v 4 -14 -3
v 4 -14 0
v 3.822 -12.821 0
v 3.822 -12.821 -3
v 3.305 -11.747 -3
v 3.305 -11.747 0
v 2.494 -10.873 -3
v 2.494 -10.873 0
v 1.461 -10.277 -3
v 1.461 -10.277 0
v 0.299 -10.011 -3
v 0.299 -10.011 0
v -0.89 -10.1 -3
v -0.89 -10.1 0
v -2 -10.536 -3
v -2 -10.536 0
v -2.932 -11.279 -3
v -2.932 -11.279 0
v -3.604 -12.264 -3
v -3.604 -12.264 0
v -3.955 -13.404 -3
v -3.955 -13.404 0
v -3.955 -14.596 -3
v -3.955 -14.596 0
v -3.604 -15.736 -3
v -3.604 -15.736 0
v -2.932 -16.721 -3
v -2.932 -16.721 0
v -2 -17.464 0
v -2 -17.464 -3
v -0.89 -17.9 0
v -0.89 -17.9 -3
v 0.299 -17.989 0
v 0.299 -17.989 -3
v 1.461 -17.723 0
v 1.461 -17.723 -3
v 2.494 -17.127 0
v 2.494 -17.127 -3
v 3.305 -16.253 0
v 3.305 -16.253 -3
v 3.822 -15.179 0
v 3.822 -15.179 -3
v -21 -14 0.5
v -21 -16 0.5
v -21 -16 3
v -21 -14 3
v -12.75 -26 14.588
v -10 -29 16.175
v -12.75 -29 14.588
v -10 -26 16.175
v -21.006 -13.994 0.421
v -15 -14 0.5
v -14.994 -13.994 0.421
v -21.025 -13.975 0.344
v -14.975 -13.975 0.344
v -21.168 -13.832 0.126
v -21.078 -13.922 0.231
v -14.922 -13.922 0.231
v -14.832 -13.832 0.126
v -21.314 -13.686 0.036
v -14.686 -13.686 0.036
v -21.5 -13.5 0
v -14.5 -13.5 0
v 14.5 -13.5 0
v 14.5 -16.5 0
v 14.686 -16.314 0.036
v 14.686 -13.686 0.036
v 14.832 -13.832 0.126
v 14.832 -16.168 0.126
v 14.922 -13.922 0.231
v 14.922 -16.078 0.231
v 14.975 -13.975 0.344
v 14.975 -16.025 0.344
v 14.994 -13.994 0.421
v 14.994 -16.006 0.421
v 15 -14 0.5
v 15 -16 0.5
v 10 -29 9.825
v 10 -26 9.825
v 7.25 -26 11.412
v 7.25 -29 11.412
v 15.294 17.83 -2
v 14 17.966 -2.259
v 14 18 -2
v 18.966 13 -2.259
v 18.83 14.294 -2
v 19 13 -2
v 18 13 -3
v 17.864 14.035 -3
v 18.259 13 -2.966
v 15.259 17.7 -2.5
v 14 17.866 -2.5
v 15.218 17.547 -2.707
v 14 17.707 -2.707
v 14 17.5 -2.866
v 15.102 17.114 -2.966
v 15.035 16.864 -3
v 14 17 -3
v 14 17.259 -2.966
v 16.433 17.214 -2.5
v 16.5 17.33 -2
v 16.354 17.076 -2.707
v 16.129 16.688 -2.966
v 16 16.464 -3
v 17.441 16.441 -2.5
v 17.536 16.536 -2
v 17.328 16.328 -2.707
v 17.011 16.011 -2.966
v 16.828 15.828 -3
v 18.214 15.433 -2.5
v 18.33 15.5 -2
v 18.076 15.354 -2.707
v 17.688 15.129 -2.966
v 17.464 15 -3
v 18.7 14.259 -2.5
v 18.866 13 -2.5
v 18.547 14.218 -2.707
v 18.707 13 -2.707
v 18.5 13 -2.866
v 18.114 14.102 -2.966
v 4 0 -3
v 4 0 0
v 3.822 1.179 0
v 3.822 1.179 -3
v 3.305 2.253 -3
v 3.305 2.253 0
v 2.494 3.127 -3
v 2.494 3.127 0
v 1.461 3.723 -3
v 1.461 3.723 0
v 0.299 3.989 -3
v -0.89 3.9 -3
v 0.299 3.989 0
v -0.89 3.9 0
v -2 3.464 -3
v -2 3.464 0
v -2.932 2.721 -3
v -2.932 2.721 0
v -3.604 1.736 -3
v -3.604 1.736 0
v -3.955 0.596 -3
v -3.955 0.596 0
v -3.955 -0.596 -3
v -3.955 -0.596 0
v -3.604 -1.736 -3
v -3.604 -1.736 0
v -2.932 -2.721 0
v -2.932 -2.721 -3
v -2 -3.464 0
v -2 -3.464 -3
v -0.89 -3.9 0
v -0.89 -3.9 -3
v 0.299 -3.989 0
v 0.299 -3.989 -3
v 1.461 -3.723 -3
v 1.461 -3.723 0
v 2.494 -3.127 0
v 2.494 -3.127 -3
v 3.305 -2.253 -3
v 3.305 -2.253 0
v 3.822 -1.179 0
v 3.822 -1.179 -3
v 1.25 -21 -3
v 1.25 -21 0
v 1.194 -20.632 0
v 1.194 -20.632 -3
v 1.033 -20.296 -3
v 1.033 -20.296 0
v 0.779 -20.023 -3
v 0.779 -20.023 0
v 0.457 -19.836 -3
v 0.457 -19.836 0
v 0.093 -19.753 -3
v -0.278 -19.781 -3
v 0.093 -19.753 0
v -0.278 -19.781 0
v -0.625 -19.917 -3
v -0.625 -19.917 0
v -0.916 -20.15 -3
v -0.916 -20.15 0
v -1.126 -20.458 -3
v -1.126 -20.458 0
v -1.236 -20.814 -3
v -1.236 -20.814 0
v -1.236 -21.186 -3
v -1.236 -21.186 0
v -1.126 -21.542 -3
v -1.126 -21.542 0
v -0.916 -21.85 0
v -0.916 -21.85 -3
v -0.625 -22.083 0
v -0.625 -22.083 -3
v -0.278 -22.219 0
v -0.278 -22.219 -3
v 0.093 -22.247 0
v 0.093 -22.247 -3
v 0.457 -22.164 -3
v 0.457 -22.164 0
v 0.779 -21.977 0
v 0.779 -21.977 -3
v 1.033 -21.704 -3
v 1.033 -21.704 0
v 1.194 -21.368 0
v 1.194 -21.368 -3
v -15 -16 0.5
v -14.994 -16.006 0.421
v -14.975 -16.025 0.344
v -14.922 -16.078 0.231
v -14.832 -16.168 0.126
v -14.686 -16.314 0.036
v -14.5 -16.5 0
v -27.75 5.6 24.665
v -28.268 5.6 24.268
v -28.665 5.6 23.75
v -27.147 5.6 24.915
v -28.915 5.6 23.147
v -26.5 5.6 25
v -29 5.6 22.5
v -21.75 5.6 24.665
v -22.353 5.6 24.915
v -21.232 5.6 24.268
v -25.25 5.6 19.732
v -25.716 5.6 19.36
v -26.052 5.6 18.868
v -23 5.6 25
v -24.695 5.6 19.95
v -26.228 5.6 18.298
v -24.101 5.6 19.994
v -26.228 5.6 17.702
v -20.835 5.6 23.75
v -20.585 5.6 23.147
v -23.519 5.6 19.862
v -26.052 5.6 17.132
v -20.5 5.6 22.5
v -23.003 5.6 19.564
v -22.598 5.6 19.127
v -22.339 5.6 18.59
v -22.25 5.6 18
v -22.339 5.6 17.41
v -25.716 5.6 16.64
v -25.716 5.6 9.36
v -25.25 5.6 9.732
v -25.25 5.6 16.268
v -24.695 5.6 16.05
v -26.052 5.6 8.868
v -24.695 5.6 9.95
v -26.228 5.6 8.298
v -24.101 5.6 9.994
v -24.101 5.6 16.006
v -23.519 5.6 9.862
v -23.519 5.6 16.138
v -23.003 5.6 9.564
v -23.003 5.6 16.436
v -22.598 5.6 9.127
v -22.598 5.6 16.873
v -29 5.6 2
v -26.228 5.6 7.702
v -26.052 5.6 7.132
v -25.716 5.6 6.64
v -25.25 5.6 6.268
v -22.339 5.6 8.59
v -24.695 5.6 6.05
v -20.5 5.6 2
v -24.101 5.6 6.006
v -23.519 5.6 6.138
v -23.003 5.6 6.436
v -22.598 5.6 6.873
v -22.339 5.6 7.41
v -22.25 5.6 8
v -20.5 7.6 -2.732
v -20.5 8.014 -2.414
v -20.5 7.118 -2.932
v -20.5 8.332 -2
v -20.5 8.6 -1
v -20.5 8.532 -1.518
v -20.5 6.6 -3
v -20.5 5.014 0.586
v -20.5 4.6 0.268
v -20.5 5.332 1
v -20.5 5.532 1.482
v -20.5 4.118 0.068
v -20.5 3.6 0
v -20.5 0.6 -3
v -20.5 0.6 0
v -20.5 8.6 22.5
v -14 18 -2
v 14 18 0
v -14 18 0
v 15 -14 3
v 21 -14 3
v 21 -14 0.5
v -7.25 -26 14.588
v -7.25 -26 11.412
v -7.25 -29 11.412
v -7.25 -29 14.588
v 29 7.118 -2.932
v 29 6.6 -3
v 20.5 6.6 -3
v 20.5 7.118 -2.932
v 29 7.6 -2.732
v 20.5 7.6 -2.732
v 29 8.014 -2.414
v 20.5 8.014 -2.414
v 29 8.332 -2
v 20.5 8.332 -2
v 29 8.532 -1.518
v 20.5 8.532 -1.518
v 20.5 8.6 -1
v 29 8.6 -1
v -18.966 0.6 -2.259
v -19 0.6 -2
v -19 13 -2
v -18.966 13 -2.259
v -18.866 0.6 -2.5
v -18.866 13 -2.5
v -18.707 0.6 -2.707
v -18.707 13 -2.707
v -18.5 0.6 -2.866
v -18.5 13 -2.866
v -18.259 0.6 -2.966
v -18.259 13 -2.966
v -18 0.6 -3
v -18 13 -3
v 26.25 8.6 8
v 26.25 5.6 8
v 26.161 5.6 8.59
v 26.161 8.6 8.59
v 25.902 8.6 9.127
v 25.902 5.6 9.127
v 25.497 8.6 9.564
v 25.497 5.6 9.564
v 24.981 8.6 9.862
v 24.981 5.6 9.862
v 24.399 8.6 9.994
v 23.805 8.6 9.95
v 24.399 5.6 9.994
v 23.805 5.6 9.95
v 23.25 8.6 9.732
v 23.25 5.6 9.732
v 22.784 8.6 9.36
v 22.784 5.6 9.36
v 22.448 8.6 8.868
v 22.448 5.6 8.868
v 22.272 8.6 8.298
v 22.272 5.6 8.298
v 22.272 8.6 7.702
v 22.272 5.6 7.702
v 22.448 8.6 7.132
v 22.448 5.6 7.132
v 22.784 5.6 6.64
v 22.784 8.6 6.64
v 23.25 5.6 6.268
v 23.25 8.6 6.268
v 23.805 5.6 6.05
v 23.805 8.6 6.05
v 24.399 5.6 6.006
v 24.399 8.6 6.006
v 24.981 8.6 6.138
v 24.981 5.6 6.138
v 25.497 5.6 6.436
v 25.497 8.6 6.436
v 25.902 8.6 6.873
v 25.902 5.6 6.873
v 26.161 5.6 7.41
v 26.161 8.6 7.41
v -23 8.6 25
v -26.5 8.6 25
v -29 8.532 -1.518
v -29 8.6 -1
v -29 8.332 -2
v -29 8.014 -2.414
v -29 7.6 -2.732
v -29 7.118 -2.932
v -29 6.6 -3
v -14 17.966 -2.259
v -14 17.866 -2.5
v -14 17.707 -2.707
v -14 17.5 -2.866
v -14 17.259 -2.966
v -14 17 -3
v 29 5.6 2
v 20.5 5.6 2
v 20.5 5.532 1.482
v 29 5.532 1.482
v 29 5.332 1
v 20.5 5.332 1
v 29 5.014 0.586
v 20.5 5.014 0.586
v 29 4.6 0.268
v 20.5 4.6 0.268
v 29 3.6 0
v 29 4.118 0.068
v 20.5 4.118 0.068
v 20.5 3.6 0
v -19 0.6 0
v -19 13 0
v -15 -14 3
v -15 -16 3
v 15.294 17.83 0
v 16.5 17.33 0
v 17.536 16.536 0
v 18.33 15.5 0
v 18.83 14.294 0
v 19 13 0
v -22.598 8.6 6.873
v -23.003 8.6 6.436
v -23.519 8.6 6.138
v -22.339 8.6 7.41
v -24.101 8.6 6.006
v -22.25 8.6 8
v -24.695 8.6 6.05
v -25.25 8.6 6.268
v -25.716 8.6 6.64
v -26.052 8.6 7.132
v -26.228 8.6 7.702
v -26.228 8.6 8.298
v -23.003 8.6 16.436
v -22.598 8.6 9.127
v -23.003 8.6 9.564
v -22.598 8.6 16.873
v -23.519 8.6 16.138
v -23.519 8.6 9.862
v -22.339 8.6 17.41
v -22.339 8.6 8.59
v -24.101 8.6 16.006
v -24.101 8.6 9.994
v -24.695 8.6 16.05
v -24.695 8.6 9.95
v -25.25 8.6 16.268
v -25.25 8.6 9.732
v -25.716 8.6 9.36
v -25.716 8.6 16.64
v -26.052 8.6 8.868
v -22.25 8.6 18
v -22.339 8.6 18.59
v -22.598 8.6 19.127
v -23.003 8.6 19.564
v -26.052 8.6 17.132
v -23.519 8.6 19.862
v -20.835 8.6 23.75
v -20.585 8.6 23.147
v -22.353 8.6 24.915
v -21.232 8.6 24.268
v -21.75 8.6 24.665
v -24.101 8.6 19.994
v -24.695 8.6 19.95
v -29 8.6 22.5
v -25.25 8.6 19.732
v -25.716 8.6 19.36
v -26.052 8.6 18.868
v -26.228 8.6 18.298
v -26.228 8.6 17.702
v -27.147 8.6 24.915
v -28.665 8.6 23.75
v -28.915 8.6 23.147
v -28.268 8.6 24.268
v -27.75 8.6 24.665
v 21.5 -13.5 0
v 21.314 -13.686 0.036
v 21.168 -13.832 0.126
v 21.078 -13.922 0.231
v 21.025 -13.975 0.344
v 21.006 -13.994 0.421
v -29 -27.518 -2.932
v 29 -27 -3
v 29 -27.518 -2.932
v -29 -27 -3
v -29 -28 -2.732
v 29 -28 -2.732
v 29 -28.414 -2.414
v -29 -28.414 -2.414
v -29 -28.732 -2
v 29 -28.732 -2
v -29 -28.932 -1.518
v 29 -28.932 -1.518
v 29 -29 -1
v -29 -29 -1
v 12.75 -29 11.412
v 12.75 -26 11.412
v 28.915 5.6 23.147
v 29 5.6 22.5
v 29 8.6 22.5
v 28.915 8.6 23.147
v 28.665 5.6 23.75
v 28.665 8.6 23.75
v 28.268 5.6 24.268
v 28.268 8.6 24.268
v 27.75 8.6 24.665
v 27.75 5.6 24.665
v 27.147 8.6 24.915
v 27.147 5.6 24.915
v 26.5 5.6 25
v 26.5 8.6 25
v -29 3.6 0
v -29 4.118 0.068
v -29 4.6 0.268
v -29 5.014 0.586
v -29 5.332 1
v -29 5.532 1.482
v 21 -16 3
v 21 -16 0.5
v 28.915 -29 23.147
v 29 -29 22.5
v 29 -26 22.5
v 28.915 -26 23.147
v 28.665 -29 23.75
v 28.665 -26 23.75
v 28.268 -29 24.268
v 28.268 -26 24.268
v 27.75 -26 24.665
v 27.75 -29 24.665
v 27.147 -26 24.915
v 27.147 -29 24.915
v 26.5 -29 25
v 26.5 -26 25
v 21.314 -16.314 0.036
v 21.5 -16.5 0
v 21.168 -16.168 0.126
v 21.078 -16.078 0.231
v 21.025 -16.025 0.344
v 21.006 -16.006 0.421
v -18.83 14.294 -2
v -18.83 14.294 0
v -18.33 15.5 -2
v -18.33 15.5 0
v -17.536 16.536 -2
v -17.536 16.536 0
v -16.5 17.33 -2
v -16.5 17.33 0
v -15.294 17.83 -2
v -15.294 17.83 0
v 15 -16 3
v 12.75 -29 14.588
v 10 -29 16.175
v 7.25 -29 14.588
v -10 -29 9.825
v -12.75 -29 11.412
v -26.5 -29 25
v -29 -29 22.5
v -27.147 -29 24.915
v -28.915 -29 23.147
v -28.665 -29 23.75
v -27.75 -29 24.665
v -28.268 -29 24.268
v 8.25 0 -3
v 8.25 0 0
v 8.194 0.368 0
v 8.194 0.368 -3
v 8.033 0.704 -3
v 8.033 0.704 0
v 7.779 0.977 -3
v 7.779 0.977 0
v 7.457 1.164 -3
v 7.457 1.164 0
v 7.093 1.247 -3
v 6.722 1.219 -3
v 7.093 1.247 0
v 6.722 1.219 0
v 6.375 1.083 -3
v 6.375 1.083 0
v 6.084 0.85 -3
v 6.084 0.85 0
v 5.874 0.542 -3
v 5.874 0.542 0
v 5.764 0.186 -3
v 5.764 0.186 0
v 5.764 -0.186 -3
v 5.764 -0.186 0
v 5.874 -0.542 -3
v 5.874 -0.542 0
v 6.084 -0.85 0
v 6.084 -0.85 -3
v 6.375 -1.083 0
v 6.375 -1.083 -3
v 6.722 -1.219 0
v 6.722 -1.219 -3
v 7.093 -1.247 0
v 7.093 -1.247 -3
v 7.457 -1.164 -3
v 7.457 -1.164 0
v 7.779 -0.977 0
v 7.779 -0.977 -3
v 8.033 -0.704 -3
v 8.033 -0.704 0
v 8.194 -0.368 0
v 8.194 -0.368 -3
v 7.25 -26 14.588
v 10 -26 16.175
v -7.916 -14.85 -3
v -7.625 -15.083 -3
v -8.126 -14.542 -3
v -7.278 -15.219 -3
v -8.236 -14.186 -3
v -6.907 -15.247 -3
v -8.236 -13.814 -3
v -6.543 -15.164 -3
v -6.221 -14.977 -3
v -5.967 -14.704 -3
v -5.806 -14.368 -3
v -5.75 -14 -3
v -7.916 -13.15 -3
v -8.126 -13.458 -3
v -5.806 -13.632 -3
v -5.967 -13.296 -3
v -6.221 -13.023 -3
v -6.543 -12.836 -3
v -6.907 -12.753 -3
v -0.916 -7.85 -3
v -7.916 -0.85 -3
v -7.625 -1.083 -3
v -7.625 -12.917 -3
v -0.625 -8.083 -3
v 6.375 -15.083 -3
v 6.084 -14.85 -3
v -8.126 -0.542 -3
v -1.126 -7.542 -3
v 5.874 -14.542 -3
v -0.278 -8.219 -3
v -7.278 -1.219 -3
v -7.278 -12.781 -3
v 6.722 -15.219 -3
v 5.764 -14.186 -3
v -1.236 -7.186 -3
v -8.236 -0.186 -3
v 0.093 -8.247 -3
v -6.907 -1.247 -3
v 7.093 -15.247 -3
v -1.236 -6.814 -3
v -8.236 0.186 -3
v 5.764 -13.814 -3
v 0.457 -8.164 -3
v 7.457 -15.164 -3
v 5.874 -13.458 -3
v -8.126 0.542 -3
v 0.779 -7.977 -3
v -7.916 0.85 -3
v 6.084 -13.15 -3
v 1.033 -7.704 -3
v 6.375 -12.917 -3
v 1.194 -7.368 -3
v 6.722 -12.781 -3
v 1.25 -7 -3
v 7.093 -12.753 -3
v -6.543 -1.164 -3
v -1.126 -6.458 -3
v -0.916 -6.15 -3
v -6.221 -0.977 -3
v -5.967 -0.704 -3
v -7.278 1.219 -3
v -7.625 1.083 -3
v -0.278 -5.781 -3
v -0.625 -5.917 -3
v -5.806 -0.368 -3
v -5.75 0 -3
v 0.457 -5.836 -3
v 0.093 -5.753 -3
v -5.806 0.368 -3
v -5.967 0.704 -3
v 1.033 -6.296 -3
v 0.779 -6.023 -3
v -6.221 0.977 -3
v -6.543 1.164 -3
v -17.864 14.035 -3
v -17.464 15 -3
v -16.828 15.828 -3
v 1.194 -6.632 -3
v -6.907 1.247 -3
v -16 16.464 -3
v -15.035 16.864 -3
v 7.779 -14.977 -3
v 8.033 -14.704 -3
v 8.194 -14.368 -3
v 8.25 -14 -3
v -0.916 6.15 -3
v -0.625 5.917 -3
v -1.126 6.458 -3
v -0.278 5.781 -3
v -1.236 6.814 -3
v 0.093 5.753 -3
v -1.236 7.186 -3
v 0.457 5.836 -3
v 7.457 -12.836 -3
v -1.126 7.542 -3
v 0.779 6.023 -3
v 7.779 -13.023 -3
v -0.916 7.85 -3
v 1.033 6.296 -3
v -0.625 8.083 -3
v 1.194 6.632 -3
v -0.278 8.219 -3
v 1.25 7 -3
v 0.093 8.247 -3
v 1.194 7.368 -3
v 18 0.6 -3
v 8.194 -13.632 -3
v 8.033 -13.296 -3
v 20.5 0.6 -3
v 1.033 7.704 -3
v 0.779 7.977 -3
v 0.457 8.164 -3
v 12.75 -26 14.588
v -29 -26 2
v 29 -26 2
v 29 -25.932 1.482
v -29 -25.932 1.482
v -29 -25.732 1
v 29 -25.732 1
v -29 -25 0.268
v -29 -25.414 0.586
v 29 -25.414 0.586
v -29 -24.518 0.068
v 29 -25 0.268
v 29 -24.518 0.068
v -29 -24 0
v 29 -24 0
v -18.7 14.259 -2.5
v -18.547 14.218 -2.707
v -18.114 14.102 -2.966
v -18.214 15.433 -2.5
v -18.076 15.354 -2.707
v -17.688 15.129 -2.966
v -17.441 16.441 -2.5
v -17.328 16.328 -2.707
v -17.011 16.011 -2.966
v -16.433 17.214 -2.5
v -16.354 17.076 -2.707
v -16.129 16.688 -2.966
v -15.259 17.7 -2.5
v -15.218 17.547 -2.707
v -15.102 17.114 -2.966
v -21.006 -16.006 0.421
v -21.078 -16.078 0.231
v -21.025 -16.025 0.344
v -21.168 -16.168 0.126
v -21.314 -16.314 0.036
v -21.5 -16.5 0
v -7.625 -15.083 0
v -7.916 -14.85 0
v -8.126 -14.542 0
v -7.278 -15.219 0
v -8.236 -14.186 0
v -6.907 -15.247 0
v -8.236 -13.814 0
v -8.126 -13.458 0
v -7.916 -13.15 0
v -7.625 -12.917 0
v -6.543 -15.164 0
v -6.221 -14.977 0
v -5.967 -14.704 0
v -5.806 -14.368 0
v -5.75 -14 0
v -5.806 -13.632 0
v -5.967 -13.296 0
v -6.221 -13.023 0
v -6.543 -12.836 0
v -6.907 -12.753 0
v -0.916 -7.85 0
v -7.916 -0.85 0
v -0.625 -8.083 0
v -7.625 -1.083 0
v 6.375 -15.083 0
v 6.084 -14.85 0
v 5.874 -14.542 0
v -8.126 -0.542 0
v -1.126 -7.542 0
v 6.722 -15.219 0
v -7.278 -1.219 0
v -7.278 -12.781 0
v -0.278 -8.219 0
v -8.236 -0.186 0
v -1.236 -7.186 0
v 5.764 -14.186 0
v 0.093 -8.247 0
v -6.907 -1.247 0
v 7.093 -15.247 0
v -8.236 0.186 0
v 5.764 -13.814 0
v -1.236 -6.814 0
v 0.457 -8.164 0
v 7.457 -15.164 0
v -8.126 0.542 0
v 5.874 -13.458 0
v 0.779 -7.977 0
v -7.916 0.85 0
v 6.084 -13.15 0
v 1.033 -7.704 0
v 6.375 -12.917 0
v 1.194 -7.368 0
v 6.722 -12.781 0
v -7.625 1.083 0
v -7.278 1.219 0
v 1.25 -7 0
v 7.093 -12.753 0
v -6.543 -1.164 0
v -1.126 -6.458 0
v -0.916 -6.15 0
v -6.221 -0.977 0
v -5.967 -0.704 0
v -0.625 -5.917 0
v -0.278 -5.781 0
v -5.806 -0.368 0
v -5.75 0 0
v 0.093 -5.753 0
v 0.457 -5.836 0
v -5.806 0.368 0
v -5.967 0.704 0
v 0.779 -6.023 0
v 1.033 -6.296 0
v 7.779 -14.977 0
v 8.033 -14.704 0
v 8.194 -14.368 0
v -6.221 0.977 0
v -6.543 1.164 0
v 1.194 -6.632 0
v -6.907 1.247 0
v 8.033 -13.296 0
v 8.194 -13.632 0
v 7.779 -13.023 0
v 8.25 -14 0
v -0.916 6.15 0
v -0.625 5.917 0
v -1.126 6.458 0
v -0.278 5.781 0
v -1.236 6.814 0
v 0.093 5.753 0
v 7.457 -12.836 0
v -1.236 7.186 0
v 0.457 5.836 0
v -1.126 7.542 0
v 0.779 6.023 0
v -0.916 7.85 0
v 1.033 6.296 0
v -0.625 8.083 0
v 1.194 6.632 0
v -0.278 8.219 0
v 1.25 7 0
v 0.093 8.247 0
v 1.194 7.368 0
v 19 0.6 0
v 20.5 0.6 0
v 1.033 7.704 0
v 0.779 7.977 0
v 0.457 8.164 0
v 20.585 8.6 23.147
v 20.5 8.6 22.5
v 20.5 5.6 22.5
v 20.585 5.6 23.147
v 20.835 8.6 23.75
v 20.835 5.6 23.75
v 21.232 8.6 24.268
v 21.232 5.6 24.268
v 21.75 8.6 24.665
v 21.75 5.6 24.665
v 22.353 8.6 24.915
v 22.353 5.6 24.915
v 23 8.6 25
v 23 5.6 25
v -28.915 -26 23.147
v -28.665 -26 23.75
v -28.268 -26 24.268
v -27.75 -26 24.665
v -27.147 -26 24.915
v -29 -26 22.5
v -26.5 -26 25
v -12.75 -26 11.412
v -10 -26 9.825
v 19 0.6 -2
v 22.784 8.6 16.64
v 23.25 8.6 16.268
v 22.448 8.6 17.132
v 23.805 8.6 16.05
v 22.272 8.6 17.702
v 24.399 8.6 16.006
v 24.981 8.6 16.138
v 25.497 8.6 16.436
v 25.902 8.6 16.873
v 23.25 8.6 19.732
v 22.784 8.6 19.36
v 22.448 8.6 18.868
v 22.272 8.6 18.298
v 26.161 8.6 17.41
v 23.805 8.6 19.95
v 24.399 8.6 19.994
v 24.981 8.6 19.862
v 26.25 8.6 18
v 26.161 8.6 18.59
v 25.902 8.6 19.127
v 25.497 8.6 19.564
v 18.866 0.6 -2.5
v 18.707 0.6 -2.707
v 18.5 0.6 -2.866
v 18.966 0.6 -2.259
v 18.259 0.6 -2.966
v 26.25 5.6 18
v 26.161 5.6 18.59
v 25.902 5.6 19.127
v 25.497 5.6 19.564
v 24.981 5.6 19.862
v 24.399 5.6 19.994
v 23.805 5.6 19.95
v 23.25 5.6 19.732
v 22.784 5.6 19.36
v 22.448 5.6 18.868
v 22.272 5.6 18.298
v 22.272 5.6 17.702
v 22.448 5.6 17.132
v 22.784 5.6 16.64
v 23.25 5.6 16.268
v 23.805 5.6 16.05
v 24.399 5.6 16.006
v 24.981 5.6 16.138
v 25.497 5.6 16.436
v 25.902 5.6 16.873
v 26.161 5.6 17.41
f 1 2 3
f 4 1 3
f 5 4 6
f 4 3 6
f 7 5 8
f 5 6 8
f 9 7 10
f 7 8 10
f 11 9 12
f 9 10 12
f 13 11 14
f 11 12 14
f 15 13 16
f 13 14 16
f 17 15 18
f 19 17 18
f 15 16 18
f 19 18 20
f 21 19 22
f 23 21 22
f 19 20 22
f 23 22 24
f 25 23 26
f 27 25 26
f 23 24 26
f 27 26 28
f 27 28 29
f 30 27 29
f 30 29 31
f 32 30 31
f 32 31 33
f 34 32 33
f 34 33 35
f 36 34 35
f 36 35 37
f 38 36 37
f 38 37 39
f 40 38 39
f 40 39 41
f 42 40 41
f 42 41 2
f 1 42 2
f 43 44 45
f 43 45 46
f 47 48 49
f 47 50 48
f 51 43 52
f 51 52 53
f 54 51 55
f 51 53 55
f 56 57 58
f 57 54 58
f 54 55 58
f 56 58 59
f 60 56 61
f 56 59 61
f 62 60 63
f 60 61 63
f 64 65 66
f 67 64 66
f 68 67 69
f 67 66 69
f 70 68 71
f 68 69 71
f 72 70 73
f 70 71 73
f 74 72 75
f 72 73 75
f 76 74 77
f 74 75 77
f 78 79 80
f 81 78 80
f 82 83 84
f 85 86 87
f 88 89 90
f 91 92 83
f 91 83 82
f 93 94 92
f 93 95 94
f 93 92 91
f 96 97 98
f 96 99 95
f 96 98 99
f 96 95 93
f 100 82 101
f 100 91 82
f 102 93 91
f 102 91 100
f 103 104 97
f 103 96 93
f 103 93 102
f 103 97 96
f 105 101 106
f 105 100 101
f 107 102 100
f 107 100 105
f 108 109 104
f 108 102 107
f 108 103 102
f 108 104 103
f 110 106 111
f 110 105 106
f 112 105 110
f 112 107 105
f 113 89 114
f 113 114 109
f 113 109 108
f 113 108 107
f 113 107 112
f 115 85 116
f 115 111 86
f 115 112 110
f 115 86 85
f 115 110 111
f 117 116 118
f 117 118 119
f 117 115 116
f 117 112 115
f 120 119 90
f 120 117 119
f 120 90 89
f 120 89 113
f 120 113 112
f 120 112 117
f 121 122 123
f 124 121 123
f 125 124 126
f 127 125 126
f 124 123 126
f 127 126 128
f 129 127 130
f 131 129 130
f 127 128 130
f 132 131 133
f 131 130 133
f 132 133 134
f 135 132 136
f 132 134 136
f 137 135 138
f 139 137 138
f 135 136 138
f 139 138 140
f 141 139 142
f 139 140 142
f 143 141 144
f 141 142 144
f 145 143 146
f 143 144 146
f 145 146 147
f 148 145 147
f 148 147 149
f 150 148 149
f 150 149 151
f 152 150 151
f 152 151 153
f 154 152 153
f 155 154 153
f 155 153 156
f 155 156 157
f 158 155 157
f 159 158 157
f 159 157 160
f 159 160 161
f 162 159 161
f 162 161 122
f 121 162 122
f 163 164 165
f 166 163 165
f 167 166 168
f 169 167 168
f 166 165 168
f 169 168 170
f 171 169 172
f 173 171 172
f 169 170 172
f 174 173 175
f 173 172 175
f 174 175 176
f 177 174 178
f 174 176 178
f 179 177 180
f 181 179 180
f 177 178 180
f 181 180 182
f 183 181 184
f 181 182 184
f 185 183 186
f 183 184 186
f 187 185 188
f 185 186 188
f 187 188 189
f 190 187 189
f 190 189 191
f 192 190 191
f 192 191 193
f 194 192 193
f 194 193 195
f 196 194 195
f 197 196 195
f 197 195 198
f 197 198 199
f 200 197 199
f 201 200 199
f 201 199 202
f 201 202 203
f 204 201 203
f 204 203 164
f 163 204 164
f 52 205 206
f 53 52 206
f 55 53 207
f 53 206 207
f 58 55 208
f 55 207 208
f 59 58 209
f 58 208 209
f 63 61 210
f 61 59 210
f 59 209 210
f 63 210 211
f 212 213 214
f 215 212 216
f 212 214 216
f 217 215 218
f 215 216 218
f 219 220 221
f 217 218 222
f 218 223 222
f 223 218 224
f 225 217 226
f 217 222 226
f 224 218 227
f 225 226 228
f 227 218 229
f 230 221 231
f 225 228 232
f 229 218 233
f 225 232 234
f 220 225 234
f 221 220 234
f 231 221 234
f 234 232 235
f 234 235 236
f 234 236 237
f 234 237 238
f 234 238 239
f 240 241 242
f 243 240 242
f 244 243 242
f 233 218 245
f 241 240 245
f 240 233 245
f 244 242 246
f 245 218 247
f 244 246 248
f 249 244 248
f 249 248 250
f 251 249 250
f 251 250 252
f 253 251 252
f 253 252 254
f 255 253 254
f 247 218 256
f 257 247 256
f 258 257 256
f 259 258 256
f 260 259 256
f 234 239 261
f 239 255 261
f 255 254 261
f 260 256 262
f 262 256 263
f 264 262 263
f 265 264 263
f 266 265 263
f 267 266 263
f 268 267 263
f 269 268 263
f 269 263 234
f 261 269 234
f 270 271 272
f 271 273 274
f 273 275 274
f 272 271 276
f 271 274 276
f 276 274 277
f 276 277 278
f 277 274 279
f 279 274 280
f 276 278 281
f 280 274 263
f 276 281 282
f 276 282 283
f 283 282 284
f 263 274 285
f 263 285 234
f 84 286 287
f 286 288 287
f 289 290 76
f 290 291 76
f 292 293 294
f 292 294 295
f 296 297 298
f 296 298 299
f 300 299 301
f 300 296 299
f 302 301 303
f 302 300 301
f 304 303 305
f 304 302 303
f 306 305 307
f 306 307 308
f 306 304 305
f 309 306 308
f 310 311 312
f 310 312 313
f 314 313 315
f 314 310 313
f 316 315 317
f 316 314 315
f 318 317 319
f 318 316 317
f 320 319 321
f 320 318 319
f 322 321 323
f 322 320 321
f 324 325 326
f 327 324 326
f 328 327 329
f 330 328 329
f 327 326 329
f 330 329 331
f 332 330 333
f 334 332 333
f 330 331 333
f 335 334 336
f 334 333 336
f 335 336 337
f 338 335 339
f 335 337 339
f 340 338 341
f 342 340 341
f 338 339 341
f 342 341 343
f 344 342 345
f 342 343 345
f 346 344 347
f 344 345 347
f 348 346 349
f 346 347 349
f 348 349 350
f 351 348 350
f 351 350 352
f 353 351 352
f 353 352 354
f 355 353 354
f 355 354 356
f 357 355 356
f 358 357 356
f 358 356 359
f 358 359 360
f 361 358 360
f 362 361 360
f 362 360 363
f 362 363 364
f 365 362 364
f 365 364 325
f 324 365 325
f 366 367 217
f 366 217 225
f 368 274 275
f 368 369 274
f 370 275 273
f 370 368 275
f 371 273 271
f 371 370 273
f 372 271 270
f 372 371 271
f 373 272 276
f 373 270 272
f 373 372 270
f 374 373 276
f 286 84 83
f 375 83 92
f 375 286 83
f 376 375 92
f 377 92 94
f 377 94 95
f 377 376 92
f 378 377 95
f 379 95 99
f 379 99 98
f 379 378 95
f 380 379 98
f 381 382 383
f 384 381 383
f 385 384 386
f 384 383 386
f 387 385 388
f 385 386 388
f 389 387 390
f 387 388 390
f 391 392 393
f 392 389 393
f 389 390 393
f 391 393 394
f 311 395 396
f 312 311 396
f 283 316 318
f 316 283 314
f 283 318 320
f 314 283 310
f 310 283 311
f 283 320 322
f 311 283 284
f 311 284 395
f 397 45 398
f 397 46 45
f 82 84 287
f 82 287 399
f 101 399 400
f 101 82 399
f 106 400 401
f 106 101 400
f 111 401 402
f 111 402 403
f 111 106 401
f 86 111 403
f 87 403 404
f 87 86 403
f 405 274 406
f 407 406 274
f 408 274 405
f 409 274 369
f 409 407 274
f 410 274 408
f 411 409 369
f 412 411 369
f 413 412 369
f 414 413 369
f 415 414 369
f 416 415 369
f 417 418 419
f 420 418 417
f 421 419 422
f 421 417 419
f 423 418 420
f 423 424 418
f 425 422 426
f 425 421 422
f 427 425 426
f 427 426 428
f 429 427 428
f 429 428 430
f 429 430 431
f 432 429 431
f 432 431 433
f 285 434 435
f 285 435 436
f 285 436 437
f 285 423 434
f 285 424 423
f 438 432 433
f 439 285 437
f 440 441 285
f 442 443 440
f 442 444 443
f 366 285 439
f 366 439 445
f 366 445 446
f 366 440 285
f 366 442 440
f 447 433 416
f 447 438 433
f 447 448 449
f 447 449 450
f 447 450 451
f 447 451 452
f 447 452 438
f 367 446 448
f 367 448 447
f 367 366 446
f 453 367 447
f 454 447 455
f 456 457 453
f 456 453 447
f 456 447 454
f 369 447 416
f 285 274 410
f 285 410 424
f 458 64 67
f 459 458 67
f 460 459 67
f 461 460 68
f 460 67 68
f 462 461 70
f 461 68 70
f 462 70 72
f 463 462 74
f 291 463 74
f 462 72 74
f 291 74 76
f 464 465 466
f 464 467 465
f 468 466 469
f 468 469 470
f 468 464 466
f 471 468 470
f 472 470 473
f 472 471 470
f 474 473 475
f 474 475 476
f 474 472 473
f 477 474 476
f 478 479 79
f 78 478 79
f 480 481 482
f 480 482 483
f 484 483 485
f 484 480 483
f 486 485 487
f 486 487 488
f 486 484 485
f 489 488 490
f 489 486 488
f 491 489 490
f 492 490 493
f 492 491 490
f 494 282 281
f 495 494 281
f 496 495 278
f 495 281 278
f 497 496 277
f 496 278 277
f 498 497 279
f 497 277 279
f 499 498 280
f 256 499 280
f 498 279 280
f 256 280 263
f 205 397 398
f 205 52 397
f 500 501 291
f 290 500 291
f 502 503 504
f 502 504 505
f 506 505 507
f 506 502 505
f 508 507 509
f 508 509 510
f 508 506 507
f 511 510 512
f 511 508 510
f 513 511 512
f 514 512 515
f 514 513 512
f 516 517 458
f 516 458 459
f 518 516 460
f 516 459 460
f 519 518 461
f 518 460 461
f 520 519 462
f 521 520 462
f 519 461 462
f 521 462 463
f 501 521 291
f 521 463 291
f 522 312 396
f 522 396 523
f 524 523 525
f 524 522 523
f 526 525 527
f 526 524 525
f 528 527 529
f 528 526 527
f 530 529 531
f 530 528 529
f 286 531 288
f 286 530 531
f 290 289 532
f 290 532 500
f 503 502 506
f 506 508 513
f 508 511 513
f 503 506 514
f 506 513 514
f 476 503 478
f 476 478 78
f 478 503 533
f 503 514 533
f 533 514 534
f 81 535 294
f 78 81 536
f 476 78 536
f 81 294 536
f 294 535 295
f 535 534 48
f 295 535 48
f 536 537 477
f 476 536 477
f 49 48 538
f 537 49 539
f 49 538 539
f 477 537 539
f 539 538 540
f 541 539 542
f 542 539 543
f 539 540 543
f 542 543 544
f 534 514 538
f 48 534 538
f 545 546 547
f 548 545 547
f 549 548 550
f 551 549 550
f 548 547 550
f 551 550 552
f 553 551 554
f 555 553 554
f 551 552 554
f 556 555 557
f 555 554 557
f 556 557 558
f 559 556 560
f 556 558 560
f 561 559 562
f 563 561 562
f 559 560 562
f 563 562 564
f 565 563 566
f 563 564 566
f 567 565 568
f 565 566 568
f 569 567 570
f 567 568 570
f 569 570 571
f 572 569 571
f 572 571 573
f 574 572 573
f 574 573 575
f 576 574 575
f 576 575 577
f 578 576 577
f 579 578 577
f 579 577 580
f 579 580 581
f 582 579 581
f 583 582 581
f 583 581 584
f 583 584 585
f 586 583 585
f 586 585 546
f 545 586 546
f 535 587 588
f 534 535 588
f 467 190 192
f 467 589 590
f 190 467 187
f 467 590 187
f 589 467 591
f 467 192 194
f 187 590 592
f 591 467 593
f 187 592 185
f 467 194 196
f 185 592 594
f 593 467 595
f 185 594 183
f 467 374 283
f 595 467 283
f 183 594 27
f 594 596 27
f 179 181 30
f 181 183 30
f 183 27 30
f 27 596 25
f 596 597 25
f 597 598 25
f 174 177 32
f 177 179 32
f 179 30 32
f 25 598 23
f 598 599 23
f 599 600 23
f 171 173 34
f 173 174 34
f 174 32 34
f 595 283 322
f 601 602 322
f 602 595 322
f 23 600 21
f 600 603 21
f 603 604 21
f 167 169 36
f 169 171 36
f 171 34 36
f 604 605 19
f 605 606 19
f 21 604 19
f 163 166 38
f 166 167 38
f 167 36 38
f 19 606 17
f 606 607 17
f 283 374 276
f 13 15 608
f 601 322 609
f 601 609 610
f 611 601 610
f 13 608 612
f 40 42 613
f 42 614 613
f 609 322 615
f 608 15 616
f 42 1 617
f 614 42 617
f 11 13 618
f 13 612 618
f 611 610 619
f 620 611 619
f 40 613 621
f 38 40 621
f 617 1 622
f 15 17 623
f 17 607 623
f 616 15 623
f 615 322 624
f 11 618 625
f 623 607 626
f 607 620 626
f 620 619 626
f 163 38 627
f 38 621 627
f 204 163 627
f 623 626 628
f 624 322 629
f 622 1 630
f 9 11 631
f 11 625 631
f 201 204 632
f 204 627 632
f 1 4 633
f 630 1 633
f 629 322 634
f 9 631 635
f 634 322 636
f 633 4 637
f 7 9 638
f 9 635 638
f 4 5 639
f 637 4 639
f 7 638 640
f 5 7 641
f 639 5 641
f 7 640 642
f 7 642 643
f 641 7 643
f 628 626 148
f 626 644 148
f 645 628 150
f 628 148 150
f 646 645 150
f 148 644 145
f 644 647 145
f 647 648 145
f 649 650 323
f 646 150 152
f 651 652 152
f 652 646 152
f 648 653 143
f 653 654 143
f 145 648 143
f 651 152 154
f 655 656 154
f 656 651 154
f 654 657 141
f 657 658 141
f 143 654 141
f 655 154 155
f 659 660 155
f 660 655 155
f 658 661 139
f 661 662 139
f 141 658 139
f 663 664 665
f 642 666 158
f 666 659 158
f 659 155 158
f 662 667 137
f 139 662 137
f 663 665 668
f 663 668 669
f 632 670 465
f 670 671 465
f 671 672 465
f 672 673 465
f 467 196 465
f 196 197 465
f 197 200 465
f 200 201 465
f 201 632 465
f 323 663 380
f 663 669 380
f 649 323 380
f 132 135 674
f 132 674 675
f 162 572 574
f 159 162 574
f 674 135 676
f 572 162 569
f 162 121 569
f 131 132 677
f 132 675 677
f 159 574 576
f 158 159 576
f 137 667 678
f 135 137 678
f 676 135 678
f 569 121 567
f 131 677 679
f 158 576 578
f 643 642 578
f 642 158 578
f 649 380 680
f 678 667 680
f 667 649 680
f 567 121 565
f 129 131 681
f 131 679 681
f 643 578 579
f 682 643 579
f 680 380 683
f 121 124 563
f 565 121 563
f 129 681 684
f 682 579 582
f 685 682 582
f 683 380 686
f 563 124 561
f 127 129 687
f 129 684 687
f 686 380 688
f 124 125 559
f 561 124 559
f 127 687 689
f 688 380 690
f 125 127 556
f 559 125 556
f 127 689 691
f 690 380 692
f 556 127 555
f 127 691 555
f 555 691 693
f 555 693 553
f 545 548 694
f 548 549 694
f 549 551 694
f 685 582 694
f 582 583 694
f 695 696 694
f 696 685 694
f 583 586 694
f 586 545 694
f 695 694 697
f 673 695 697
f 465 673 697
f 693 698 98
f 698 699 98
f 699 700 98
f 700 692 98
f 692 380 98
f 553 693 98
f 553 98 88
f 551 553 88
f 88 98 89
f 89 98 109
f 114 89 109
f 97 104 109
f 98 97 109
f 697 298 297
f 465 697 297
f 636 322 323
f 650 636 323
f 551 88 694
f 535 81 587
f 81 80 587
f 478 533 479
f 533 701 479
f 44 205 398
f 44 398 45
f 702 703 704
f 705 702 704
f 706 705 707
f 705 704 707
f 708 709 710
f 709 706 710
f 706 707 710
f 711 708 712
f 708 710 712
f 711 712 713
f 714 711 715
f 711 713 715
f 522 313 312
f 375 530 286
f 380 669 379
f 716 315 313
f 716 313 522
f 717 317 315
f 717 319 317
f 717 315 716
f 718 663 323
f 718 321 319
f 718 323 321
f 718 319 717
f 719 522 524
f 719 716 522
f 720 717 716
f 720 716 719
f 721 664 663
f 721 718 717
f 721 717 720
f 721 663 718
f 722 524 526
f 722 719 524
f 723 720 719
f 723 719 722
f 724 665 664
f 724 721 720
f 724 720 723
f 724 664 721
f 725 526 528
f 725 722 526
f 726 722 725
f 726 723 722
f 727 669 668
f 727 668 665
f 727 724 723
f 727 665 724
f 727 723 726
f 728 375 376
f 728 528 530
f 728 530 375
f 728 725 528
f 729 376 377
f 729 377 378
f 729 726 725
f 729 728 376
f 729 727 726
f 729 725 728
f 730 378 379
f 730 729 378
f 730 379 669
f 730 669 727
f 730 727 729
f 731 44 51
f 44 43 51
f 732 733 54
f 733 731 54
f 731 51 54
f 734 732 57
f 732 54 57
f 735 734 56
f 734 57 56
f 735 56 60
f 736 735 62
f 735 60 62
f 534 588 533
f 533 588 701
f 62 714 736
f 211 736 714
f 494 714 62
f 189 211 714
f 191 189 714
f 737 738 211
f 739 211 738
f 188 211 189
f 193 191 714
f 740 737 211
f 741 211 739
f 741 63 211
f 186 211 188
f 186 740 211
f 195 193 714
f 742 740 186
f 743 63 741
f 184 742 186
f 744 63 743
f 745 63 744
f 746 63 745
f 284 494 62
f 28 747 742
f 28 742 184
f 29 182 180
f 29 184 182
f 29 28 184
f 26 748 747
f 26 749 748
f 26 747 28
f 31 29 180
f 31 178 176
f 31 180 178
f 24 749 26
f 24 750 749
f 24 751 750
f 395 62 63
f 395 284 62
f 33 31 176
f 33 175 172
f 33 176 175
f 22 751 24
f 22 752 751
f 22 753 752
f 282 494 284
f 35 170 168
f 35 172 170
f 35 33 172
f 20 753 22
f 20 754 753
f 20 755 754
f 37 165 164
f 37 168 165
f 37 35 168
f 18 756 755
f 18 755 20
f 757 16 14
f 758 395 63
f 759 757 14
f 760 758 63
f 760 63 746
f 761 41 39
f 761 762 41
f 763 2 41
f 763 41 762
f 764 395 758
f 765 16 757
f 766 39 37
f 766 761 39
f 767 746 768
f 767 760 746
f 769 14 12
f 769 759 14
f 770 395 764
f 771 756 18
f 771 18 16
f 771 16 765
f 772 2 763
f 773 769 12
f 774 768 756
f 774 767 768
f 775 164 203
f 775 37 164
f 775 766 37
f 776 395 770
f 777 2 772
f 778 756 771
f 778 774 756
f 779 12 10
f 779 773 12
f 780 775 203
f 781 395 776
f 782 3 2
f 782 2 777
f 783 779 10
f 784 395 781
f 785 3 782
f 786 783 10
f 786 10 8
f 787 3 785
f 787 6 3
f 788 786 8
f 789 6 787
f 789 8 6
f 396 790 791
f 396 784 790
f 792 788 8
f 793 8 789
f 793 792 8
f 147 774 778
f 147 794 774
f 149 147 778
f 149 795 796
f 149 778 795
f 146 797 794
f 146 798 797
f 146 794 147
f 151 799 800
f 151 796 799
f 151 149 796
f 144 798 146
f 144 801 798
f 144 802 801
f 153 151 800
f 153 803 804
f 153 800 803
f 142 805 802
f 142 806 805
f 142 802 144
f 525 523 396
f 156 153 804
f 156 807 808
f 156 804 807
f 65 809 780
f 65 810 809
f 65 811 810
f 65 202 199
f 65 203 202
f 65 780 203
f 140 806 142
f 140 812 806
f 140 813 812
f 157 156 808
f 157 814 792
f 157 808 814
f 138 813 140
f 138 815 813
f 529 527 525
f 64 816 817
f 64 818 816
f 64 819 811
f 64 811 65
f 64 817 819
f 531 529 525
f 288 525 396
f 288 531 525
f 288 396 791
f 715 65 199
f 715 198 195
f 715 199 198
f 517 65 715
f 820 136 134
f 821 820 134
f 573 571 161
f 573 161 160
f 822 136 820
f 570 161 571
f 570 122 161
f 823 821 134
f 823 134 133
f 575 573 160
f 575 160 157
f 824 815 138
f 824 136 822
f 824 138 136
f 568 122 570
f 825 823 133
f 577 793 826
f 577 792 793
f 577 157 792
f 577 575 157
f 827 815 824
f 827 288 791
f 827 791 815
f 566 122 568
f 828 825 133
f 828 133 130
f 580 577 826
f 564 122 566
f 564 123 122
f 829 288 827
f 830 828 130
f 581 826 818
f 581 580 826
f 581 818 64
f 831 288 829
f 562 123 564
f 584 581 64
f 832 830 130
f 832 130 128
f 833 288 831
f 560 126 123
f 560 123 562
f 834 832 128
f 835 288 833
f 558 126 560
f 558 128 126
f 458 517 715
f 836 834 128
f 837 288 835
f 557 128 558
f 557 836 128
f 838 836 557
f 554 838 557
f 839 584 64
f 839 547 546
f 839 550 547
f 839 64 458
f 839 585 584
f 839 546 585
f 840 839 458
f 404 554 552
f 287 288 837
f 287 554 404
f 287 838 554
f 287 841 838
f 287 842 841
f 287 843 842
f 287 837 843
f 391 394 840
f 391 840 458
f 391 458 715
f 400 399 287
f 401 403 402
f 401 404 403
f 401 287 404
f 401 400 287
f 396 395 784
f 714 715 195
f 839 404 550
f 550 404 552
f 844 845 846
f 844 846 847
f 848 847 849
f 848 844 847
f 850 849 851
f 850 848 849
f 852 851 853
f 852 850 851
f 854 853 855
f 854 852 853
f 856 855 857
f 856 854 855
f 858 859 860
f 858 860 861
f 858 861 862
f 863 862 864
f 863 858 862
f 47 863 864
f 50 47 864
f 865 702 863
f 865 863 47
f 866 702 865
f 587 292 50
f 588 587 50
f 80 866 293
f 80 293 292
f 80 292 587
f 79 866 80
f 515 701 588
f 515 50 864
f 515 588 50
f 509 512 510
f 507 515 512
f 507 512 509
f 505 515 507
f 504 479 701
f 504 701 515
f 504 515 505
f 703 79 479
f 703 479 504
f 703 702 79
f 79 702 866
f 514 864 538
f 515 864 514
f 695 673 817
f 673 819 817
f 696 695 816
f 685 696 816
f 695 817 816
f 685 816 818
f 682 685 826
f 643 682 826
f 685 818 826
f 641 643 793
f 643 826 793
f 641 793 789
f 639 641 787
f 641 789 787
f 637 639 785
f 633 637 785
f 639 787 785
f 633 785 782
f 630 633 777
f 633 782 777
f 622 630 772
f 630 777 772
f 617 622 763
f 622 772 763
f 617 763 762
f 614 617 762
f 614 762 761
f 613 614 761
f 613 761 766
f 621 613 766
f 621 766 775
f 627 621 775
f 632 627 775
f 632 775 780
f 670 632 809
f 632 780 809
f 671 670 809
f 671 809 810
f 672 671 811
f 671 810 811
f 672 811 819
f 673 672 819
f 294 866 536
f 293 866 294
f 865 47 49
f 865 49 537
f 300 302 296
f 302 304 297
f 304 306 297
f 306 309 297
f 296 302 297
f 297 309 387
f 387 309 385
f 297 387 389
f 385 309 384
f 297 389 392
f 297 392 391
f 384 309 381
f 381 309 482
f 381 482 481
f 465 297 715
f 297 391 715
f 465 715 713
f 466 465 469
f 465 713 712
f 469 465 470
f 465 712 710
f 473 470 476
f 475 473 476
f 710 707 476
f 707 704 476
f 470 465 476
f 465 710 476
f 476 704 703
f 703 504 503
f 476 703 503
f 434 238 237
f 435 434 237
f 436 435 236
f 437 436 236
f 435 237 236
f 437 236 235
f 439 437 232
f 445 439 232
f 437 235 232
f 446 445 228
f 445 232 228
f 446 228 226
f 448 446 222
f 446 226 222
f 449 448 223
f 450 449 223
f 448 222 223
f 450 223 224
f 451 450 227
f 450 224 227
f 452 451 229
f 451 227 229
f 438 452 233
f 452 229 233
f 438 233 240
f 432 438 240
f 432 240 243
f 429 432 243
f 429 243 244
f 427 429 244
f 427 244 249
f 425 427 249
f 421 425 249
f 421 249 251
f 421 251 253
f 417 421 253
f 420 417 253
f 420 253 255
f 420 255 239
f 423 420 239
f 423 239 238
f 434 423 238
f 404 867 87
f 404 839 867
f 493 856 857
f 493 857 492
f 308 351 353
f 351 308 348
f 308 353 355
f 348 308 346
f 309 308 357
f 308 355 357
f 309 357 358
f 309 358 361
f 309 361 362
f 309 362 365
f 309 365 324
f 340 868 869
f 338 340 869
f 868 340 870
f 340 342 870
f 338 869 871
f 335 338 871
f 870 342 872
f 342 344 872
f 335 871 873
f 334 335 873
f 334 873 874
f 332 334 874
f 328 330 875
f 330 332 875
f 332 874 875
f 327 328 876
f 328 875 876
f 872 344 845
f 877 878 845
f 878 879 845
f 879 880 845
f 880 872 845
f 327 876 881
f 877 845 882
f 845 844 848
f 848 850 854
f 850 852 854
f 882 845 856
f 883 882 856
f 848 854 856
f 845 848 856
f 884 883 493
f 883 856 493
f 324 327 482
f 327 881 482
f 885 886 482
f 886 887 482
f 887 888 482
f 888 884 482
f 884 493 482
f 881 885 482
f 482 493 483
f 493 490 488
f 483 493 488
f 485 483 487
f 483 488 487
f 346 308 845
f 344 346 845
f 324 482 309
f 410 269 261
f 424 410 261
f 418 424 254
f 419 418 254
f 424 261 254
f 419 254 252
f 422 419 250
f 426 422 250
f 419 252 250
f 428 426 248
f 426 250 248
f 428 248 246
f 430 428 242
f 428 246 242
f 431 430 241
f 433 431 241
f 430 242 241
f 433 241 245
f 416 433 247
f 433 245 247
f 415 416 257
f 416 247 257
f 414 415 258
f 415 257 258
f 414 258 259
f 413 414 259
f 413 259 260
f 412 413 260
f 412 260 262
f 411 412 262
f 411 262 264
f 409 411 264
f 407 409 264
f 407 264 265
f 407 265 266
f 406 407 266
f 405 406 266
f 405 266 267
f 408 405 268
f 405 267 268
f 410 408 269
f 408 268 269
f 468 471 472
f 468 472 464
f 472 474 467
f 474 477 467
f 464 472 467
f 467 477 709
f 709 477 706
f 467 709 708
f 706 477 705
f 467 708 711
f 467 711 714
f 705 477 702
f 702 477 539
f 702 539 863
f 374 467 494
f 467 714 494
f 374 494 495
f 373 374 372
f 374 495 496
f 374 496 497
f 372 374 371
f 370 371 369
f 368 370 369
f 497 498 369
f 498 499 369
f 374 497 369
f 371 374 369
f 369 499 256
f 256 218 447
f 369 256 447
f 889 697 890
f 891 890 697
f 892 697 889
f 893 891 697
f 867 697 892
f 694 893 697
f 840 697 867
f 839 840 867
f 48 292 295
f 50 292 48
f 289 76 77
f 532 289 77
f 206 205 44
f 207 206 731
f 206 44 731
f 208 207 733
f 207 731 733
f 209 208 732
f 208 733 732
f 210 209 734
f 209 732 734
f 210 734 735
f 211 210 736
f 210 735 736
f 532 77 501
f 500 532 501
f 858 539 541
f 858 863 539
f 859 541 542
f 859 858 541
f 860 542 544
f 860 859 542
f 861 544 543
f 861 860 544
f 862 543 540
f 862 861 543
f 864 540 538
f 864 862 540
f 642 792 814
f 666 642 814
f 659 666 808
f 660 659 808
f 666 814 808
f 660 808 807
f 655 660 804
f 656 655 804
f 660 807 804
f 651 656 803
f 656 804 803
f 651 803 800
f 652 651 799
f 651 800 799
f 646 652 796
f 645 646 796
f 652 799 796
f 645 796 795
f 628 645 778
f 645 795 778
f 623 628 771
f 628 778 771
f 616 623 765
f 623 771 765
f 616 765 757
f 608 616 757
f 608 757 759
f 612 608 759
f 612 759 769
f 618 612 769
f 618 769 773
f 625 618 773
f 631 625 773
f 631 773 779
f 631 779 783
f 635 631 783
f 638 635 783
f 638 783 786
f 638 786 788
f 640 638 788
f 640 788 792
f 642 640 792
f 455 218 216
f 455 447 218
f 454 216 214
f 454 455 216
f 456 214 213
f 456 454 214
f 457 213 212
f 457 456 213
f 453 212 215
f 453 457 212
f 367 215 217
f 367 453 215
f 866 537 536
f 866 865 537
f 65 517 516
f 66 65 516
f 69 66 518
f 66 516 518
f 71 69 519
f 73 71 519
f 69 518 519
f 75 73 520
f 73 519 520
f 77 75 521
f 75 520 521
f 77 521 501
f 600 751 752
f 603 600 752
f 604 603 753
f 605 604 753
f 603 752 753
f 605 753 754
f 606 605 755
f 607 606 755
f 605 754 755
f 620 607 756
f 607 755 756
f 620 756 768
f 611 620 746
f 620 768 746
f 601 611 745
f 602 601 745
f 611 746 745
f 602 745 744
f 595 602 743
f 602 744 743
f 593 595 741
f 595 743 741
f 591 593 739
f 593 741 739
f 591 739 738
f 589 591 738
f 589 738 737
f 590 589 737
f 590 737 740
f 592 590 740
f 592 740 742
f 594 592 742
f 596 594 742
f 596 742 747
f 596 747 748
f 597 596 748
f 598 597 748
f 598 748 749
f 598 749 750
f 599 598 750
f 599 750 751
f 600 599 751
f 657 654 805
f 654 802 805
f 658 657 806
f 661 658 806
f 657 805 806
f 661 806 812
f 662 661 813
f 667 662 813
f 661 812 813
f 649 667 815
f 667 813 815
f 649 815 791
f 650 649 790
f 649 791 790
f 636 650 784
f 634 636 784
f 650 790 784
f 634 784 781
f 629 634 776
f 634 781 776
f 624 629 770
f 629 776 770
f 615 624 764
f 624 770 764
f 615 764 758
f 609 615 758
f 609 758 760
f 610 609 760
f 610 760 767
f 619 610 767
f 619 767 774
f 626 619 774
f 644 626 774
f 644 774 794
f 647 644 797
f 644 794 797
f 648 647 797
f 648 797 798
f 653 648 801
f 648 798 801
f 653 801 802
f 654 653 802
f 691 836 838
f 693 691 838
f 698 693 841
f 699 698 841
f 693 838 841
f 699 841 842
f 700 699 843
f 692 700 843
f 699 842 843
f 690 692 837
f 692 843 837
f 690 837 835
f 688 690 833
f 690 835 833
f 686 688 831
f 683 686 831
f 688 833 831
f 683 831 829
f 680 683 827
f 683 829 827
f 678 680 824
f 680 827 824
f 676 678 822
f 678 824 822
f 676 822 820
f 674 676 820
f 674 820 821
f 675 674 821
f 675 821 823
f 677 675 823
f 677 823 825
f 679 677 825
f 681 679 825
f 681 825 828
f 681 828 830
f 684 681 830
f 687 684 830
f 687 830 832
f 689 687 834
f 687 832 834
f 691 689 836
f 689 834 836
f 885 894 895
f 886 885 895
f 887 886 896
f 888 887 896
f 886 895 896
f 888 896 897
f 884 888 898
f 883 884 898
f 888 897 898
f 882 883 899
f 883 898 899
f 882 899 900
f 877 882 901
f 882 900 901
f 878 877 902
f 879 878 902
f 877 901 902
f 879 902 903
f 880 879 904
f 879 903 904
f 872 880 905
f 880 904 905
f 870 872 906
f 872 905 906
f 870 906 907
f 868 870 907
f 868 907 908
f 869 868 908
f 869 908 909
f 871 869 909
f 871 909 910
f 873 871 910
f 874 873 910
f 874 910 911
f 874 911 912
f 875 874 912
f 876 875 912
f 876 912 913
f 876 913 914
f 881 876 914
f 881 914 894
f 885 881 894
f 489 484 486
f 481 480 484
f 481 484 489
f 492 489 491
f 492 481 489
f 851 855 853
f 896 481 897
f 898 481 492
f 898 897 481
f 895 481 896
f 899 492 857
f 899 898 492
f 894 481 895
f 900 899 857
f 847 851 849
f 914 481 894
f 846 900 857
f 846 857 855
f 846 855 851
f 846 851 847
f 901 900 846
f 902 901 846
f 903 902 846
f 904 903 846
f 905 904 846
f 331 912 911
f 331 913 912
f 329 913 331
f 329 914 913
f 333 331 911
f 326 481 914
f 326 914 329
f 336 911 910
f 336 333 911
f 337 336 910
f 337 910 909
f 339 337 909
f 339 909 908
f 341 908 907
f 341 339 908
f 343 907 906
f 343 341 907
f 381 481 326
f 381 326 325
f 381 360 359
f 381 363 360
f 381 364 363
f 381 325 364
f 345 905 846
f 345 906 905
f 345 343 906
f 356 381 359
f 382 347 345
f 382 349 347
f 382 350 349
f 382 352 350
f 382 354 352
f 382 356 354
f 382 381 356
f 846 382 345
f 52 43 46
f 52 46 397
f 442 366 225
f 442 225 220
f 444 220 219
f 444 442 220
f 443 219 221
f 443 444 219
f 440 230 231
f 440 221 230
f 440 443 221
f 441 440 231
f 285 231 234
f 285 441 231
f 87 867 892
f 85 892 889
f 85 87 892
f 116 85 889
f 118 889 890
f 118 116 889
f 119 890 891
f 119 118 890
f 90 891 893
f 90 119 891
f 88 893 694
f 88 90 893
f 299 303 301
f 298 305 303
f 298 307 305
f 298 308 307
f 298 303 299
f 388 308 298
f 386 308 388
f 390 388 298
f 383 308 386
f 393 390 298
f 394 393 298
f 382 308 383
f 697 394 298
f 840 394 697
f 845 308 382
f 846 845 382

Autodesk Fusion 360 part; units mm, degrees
sketch "Sketch1" plane through (0, 0, 0) normal (0, 0, 1) x (1, 0, 0)
  line L0 (-29, 18) -> (29, 18)
  line L1 (29, 18) -> (29, -18)
  line L2 (29, -18) -> (-29, -18)
  line L3 (-29, -18) -> (-29, 18)
  line L4 (-29, 18) -> (29, -18) construction
  line L5 (29, 18) -> (-29, -18) construction
  line L6 (29, 8.6) -> (-29, 8.6) construction
  line L7 (-29, -18) -> (-29, -26)
  line L8 (-29, -26) -> (29, -26)
  line L9 (29, -26) -> (29, -18)
  line L10 (29, -26) -> (29, -29)
  line L11 (29, -29) -> (-29, -29)
  line L12 (-29, -29) -> (-29, -26)
  line L13 (-29, 5.6) -> (-20.5, 5.6)
  line L14 (-20.5, 5.6) -> (-20.5, 8.6)
  line L15 (-20.5, 8.6) -> (-29, 8.6)
  line L16 (-20.5, 5.6) -> (-20.5, 0.6)
  line L17 (-20.5, 0.6) -> (-19, 0.6)
  line L18 (-19, 0.6) -> (-19, 8.6)
  line L19 (0, -29) -> (0, 18) construction
  line L20 (20.5, 8.6) -> (29, 8.6)
  line L21 (20.5, 5.6) -> (20.5, 8.6)
  line L22 (29, 5.6) -> (20.5, 5.6)
  line L23 (20.5, 5.6) -> (20.5, 0.6)
  line L24 (20.5, 0.6) -> (19, 0.6)
  line L25 (19, 0.6) -> (19, 8.6)
  circle A0 centre (0, 0) radius 4
  circle A1 centre (0, 0) radius 7 construction
  circle A2 centre (0, 7) radius 1.25
  circle A3 centre (-7, 0) radius 1.25
  circle A4 centre (0, -7) radius 1.25
  circle A5 centre (7, 0) radius 1.25
  line L26 (-19, 8.6) -> (-20.5, 8.6)
  line L27 (19, 8.6) -> (20.5, 8.6)
  line L28 (-19, 8.6) -> (-19, 18)
  line L29 (19, 8.6) -> (19, 18)
  line L30 (-21, -14) -> (-15, -14)
  line L31 (-15, -14) -> (-15, -16)
  line L32 (-15, -16) -> (-21, -16)
  line L33 (-21, -16) -> (-21, -14)
  line L34 (15, -14) -> (15, -16)
  line L35 (21, -16) -> (21, -14)
  line L36 (15, -16) -> (21, -16)
  line L37 (21, -14) -> (15, -14)
  line L38 (0, -7) -> (29, -7) construction
  circle A6 centre (0, -14) radius 4
  circle A7 centre (0, -21) radius 1.25
  circle A8 centre (7, -14) radius 1.25
  circle A9 centre (-7, -14) radius 1.25
  dimension "d4" = 36
  dimension "d5" = 58
  dimension "d9" = 26.6
  dimension "d11" = 8
  dimension "d12" = 8
  dimension "d13" = 3
  dimension "d14" = 3
  dimension "d16" = 8.5
  dimension "d17" = 3
  dimension "d18" = 1.5
  dimension "d19" = 8
  dimension "d22" = 8
  dimension "d23" = 14
  dimension "d24" = 2.5
  dimension "d26" = 360
  dimension "d56" = 2
  dimension "d57" = 6
  dimension "d58" = 8
  dimension "d59" = 2
extrude "Extrude3" add sketch "Sketch1" against normal blind 3 contours L0 L1 L2 L3 L13 L16 L17 L18 L22 L23 L24 L25 L28 L29 | L3 L13 L14 L15 | L2 L7 L8 L9 | L1 L20 L21 L22 | L8 L10 L11 L12 | L30 L31 L32 L33 | L34 L35 L36 L37
extrude "Extrude4" add sketch "Sketch1" along normal blind 25 contours L3 L13 L14 L15 | L1 L20 L21 L22 | L8 L10 L11 L12
fillet "Fillet1" radius 2.5 6 edges at (29, -27.5, 25) (-29, -27.5, 25) (29, 7.1, 25) (-29, 7.1, 25) (-20.5, 7.1, 25) (20.5, 7.1, 25)
fillet "Fillet2" radius 5 2 edges at (19, 18, -1.5) (-19, 18, -1.5)
fillet "Fillet3" radius 2 6 edges at (0, -26, 0) (0, -29, -3) (24.75, 5.6, 0) (24.75, 8.6, -3) (-24.75, 8.6, -3) (-24.75, 5.6, 0)
fillet "Fillet3" radius 1 6 edges at (-19, 6.8, -3) (-17.5355, 16.5355, -3) (0, 18, -3) (17.5355, 16.5355, -3) (19, 10.8, -3) (19, 4.6, -3)
sketch "Sketch3" plane through (0, 5.6, 0) normal (0, -1, 0) x (1, 0, 0)
  line L0 (-29, 2) -> (-20.5, 2)
  line L1 (-20.5, 2) -> (-20.5, 22.5)
  arc A0 (-20.5, 22.5) -> (-23, 25) centre (-23, 22.5) ccw
  line L2 (-23, 25) -> (-26.5, 25)
  arc A1 (-26.5, 25) -> (-29, 22.5) centre (-26.5, 22.5) ccw
  line L3 (-29, 22.5) -> (-29, 2)
  line L4 (0, 0) -> (0, 25) construction
  line L5 (0, 0) -> (-24.25, 0) construction
  line L6 (-24.25, 0) -> (-24.25, 25) construction
  line L7 (-24.25, 12.5) -> (0, 12.5) construction
  circle A2 centre (-24.25, 8) radius 2
  circle A3 centre (-24.25, 18) radius 2
  line L8 (-7.25, 14.5877) -> (-10, 16.1754)
  line L9 (-10, 16.1754) -> (-12.75, 14.5877)
  line L10 (-12.75, 14.5877) -> (-12.75, 11.4123)
  line L11 (-12.75, 11.4123) -> (-10, 9.8246)
  line L12 (-10, 9.8246) -> (-7.25, 11.4123)
  line L13 (-7.25, 11.4123) -> (-7.25, 14.5877)
  circle A4 centre (24.25, 18) radius 2
  circle A5 centre (24.25, 8) radius 2
  line L14 (12.75, 11.4123) -> (10, 9.8246)
  line L15 (12.75, 14.5877) -> (12.75, 11.4123)
  line L16 (10, 16.1754) -> (12.75, 14.5877)
  line L17 (7.25, 14.5877) -> (10, 16.1754)
  line L18 (7.25, 11.4123) -> (7.25, 14.5877)
  line L19 (10, 9.8246) -> (7.25, 11.4123)
  point P0 (-10, 13)
  dimension "d49" = 25
  dimension "d50" = 24.25
  dimension "d51" = 25
  dimension "d52" = 4
  dimension "d53" = 4.5
  dimension "d54" = 10
  dimension "d55" = 4
  dimension "d64" = 2.75
  dimension "d65" = 0.5
  dimension "d66" = 14.25
extrude "Extrude5" add sketch "Sketch1" along normal blind 3 contours L30 L31 L32 L33 | L34 L35 L36 L37
fillet "Fillet4" radius 0.5 8 edges at (18, -14, 0) (21, -15, 0) (18, -16, 0) (15, -15, 0) (-15, -15, 0) (-18, -14, 0) (-21, -15, 0) (-18, -16, 0)
extrude "Extrude6" cut sketch "Sketch3" against normal through all contours A2 | A3 | A4 | A5
extrude "Extrude7" cut sketch "Sketch3" along normal blind 42 contours L8 L9 L10 L11 L12 L13 | L14 L15 L16 L17 L18 L19
equation "thickness = 3 mm"
equation "base_width = 36 mm"
equation "base_length = 58 mm"
equation "d4 = base_width"
equation "d5 = base_length"
equation "d9 = servoHolder_height"
equation "servo_clearence = 8 mm"
equation "d11 = servo_clearence"
equation "d12 = servo_clearence"
equation "d13 = thickness"
equation "d14 = thickness"
equation "servoHolder_height = 26.6 mm"
equation "d17 = thickness"
equation "main_hole = 8 mm"
equation "titner_hole = 2.5 mm"
equation "d22 = main_hole"
equation "d24 = titner_hole"
equation "base_height = 25 mm"
equation "d32 = -thickness"
equation "d34 = base_height"
equation "d50 = ( 48.5 / 2 ) * 1 mm"
equation "d64 = ( 5.5 / 2 ) * 1 mm"
